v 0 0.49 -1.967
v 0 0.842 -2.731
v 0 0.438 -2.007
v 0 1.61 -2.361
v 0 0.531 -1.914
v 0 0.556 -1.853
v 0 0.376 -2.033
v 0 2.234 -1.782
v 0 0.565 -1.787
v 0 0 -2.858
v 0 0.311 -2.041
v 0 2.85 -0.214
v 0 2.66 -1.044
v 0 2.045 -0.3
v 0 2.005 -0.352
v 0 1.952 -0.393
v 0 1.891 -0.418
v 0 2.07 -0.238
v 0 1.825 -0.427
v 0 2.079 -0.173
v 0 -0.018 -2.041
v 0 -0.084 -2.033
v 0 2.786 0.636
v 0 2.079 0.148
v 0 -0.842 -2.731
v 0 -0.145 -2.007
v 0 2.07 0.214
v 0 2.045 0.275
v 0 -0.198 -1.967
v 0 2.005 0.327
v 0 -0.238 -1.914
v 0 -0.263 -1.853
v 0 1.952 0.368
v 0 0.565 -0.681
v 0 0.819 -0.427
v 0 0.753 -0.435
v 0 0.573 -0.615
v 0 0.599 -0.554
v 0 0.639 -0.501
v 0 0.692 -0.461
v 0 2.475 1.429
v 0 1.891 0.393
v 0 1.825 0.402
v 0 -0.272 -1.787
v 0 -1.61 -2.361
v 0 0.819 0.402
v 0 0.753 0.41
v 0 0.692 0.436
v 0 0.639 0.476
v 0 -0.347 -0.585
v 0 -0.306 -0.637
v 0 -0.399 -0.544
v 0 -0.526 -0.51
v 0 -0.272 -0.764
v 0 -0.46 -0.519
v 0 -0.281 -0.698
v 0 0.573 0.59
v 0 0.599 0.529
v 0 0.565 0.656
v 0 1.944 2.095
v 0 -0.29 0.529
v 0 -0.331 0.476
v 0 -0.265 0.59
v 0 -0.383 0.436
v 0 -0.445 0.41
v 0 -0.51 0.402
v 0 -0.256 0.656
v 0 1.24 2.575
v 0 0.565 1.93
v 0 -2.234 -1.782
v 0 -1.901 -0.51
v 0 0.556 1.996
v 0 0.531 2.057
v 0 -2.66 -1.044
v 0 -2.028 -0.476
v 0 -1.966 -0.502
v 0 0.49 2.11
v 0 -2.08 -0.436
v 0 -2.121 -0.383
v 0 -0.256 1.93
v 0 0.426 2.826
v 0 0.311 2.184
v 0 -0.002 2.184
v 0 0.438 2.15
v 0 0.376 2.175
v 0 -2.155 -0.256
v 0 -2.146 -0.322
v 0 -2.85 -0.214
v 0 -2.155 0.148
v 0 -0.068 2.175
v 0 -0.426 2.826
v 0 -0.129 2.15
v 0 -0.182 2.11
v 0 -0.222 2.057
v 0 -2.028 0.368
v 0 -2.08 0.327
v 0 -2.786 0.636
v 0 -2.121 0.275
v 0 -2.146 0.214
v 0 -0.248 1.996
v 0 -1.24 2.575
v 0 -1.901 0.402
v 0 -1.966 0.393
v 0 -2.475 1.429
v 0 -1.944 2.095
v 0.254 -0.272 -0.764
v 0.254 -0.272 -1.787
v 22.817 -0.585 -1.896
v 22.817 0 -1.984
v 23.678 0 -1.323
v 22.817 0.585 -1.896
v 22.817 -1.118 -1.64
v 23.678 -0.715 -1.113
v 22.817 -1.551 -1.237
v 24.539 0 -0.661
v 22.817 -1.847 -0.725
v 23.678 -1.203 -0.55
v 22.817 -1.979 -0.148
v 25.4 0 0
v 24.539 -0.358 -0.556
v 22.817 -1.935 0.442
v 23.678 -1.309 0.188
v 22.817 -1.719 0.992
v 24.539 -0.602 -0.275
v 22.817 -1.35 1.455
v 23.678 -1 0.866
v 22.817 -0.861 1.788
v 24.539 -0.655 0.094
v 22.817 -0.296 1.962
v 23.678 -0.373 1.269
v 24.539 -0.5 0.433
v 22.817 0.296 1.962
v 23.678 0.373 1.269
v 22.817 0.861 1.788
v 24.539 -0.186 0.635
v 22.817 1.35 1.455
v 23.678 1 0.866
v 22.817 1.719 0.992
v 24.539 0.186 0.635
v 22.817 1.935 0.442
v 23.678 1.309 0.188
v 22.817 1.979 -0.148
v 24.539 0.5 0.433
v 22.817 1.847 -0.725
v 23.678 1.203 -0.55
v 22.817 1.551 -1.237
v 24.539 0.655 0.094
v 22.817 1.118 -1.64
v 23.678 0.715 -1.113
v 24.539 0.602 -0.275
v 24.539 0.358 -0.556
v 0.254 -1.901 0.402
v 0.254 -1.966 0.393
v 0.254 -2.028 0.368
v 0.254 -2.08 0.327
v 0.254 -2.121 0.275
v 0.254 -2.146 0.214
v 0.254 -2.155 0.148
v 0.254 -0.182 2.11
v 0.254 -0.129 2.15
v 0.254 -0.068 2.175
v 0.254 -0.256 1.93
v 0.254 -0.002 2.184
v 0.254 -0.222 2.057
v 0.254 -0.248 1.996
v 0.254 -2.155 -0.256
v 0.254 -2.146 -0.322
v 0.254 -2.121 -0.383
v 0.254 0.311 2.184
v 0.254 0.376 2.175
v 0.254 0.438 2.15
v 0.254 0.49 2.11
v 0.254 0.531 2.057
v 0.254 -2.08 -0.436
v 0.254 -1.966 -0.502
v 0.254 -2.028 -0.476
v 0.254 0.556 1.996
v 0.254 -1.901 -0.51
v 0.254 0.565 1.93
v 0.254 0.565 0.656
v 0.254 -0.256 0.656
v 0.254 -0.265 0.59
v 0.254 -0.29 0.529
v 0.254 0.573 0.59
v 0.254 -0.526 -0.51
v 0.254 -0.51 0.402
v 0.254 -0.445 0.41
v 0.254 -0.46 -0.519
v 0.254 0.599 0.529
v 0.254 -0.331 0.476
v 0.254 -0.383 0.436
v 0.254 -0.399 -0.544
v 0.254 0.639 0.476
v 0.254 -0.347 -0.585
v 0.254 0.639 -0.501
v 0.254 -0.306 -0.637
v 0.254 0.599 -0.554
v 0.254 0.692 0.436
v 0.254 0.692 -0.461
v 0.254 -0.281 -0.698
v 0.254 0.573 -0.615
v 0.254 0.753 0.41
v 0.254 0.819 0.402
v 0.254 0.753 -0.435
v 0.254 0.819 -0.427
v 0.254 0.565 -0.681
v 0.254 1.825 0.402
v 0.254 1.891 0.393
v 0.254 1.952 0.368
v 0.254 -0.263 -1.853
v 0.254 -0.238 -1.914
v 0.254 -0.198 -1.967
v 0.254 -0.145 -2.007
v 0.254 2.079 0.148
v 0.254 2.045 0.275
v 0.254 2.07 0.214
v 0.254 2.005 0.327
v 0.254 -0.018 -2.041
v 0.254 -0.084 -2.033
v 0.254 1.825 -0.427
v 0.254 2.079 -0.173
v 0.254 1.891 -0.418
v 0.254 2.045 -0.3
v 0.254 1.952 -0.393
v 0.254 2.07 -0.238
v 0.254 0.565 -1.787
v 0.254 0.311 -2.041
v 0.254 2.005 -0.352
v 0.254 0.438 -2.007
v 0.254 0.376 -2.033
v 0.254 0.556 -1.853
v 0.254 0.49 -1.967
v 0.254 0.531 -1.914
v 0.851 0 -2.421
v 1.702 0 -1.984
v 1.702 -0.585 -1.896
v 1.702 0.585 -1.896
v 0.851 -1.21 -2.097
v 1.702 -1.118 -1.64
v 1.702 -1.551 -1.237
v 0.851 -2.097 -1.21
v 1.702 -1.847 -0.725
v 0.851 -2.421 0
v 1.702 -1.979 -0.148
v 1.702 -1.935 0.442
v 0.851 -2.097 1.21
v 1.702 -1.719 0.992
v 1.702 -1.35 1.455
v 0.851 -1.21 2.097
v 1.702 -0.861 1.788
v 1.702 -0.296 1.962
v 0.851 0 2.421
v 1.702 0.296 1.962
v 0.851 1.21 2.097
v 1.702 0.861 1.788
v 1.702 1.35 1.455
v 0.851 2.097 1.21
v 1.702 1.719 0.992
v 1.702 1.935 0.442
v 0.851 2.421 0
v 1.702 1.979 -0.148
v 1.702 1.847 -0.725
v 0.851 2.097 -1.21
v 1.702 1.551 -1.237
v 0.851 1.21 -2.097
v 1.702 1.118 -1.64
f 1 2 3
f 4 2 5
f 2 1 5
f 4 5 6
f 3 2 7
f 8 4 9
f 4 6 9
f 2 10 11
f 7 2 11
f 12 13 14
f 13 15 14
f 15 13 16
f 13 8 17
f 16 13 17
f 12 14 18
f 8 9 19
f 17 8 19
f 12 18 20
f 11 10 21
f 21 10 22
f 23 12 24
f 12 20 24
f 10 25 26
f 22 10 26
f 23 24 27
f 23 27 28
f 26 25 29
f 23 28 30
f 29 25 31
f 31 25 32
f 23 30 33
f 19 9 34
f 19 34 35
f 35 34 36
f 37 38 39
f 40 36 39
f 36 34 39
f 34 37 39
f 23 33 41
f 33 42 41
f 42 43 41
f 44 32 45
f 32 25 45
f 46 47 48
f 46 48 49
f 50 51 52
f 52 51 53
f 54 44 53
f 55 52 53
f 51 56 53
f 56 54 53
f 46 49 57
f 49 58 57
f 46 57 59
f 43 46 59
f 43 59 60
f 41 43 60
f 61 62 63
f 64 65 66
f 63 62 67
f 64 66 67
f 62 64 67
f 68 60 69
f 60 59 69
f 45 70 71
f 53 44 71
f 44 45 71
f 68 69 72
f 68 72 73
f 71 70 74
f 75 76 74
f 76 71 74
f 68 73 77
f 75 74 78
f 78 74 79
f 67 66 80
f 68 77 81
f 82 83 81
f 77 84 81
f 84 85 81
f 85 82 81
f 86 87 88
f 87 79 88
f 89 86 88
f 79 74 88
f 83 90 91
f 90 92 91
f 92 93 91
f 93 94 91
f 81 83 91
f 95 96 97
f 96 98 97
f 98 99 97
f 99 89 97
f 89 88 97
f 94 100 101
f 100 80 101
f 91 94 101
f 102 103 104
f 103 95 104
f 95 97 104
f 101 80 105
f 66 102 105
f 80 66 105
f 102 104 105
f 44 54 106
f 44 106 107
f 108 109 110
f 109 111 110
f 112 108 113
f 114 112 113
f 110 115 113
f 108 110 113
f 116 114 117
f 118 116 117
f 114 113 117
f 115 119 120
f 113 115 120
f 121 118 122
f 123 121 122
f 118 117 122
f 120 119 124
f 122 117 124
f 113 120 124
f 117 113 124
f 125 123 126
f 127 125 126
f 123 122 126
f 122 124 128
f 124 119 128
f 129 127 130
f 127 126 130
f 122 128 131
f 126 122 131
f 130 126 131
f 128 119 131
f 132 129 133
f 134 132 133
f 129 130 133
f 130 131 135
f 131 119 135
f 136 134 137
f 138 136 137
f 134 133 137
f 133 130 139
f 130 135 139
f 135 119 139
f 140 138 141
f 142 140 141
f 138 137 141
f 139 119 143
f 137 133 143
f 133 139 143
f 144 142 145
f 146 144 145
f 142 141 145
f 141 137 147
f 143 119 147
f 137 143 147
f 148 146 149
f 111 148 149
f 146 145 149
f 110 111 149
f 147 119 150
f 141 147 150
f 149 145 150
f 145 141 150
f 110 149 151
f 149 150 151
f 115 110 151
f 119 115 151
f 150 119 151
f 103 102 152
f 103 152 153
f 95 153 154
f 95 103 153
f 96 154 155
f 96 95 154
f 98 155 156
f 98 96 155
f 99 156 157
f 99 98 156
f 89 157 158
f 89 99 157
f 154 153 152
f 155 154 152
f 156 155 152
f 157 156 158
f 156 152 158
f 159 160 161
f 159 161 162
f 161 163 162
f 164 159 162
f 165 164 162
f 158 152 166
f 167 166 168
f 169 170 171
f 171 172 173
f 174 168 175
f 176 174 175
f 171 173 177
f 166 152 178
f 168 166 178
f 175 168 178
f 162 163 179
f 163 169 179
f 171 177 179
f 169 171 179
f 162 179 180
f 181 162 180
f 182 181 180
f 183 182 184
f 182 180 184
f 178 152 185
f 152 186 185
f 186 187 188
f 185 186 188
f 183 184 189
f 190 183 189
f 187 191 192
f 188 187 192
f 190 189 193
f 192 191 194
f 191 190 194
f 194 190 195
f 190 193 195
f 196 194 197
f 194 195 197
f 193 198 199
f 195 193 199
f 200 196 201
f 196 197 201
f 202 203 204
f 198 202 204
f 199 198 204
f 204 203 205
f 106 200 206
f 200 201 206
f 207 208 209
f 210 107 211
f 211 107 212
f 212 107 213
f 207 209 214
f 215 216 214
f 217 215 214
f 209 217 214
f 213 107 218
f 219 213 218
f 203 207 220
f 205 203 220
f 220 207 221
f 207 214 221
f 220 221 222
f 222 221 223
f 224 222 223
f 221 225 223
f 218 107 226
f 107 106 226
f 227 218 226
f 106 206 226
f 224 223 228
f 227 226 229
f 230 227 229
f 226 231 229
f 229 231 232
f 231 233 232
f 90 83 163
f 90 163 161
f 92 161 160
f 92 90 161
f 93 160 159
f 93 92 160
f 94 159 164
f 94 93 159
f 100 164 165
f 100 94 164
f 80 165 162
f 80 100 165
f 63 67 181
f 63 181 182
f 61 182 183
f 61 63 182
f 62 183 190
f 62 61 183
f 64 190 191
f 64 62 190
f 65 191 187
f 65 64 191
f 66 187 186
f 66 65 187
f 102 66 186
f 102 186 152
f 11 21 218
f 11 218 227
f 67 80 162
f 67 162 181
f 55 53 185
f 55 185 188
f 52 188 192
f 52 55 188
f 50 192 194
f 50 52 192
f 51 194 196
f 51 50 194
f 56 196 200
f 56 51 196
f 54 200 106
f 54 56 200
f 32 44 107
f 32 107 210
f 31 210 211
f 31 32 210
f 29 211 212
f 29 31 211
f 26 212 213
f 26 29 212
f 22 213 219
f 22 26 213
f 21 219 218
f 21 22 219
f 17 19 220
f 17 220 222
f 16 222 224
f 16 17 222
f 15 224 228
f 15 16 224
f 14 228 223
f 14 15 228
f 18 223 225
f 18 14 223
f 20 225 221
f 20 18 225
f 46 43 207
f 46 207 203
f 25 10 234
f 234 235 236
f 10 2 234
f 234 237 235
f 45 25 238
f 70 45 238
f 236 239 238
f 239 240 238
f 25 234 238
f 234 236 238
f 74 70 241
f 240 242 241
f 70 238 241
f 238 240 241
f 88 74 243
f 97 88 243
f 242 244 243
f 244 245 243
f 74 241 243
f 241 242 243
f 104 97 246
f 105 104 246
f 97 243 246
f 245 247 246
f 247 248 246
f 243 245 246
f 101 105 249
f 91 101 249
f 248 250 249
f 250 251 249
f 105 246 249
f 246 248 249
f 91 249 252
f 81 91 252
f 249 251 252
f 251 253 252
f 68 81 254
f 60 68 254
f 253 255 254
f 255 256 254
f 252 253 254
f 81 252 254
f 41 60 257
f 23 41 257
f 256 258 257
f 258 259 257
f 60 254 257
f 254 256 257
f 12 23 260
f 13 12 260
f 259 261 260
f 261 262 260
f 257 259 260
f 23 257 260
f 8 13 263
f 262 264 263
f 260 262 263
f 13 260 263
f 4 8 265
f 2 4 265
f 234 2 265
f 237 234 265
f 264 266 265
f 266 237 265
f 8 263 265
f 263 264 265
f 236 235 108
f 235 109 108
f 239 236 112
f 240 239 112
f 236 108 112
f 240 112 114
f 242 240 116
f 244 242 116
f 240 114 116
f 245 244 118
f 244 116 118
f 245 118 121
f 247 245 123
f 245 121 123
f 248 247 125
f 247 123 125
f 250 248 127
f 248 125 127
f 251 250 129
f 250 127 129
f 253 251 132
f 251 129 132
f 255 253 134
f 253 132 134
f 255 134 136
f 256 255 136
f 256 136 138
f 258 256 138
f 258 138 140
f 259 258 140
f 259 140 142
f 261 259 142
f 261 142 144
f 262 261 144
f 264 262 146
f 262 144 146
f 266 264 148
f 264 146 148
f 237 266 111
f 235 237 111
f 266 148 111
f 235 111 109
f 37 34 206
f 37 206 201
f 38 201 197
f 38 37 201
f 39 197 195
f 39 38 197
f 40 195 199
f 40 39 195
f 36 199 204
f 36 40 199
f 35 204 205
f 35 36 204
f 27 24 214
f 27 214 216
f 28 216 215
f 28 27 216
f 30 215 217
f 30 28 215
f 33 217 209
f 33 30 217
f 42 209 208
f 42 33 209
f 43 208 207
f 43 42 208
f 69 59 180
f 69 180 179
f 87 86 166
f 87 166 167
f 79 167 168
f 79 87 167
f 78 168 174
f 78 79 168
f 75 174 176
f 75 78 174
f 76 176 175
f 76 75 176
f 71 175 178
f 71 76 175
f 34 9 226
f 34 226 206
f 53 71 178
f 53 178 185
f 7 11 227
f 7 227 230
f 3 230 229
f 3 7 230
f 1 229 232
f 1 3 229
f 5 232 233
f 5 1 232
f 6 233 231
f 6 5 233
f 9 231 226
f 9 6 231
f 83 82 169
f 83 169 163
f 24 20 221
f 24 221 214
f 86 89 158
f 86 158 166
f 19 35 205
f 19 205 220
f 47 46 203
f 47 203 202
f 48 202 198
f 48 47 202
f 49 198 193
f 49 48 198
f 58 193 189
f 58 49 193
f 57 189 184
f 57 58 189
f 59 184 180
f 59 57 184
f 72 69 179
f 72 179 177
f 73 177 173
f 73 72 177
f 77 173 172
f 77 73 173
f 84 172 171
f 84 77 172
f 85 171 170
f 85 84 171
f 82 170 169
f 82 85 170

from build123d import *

# Parameters (mm, degrees)
CUT_EXTRUDE2_DEPTH = 0.254


with BuildPart() as part:
    # Sketch1 → Revolve1 (revolve)
    with BuildSketch(Plane.XY):
        Polygon((0, 0), (0, 2.8575), (1.7018, 1.984375), (22.817280365, 1.984375), (25.4, 0), align=None)
    revolve(axis=Axis((25.4, 0, 0), (-1, 0, 0)))

    # Sketch2 → Cut-Extrude2 (cut)
    with BuildSketch(Plane(origin=(0, 0, 0), x_dir=(0, 0, -1), z_dir=(1, 0, 0))):
        with BuildLine():
            Line((1.787373723, 0.564567778), (0.680541301, 0.564567778))
            ThreePointArc((0.680541301, 0.564567778), (0.500936179, 0.638962656), (0.426541301, 0.818567778))
            Line((0.426541301, 0.818567778), (0.426541301, 1.824996112))
            ThreePointArc((0.426541301, 1.824996112), (0.352146424, 2.004601234), (0.172541301, 2.078996112))
            Line((0.172541301, 2.078996112), (-0.147792428, 2.078996112))
            ThreePointArc((-0.147792428, 2.078996112), (-0.327397551, 2.004601234), (-0.401792428, 1.824996112))
            Line((-0.401792428, 1.824996112), (-0.401792428, 0.818567778))
            ThreePointArc((-0.401792428, 0.818567778), (-0.476187306, 0.638962656), (-0.655792428, 0.564567778))
            Line((-0.655792428, 0.564567778), (-1.929964998, 0.564567778))
            ThreePointArc((-1.929964998, 0.564567778), (-2.10957012, 0.490172901), (-2.183964998, 0.310567778))
            Line((-2.183964998, 0.310567778), (-2.183964998, -0.002294215))
            ThreePointArc((-2.183964998, -0.002294215), (-2.10957012, -0.181899337), (-1.929964998, -0.256294215))
            Line((-1.929964998, -0.256294215), (-0.655792428, -0.256294215))
            ThreePointArc((-0.655792428, -0.256294215), (-0.476187306, -0.330689092), (-0.401792428, -0.510294215))
            Line((-0.401792428, -0.510294215), (-0.401792428, -1.900709616))
            ThreePointArc((-0.401792428, -1.900709616), (-0.327397551, -2.080314739), (-0.147792428, -2.154709616))
            Line((-0.147792428, -2.154709616), (0.256211375, -2.154709616))
            ThreePointArc((0.256211375, -2.154709616), (0.435816497, -2.080314739), (0.510211375, -1.900709616))
            Line((0.510211375, -1.900709616), (0.510211375, -0.526132959))
            ThreePointArc((0.510211375, -0.526132959), (0.584606253, -0.346527836), (0.764211375, -0.272132959))
            Line((0.764211375, -0.272132959), (1.787373723, -0.272132959))
            ThreePointArc((1.787373723, -0.272132959), (1.966978846, -0.197738081), (2.041373723, -0.018132959))
            Line((2.041373723, -0.018132959), (2.041373723, 0.310567778))
            ThreePointArc((2.041373723, 0.310567778), (1.966978846, 0.490172901), (1.787373723, 0.564567778))
        make_face()
    extrude(amount=CUT_EXTRUDE2_DEPTH, mode=Mode.SUBTRACT)


solid = part.part
